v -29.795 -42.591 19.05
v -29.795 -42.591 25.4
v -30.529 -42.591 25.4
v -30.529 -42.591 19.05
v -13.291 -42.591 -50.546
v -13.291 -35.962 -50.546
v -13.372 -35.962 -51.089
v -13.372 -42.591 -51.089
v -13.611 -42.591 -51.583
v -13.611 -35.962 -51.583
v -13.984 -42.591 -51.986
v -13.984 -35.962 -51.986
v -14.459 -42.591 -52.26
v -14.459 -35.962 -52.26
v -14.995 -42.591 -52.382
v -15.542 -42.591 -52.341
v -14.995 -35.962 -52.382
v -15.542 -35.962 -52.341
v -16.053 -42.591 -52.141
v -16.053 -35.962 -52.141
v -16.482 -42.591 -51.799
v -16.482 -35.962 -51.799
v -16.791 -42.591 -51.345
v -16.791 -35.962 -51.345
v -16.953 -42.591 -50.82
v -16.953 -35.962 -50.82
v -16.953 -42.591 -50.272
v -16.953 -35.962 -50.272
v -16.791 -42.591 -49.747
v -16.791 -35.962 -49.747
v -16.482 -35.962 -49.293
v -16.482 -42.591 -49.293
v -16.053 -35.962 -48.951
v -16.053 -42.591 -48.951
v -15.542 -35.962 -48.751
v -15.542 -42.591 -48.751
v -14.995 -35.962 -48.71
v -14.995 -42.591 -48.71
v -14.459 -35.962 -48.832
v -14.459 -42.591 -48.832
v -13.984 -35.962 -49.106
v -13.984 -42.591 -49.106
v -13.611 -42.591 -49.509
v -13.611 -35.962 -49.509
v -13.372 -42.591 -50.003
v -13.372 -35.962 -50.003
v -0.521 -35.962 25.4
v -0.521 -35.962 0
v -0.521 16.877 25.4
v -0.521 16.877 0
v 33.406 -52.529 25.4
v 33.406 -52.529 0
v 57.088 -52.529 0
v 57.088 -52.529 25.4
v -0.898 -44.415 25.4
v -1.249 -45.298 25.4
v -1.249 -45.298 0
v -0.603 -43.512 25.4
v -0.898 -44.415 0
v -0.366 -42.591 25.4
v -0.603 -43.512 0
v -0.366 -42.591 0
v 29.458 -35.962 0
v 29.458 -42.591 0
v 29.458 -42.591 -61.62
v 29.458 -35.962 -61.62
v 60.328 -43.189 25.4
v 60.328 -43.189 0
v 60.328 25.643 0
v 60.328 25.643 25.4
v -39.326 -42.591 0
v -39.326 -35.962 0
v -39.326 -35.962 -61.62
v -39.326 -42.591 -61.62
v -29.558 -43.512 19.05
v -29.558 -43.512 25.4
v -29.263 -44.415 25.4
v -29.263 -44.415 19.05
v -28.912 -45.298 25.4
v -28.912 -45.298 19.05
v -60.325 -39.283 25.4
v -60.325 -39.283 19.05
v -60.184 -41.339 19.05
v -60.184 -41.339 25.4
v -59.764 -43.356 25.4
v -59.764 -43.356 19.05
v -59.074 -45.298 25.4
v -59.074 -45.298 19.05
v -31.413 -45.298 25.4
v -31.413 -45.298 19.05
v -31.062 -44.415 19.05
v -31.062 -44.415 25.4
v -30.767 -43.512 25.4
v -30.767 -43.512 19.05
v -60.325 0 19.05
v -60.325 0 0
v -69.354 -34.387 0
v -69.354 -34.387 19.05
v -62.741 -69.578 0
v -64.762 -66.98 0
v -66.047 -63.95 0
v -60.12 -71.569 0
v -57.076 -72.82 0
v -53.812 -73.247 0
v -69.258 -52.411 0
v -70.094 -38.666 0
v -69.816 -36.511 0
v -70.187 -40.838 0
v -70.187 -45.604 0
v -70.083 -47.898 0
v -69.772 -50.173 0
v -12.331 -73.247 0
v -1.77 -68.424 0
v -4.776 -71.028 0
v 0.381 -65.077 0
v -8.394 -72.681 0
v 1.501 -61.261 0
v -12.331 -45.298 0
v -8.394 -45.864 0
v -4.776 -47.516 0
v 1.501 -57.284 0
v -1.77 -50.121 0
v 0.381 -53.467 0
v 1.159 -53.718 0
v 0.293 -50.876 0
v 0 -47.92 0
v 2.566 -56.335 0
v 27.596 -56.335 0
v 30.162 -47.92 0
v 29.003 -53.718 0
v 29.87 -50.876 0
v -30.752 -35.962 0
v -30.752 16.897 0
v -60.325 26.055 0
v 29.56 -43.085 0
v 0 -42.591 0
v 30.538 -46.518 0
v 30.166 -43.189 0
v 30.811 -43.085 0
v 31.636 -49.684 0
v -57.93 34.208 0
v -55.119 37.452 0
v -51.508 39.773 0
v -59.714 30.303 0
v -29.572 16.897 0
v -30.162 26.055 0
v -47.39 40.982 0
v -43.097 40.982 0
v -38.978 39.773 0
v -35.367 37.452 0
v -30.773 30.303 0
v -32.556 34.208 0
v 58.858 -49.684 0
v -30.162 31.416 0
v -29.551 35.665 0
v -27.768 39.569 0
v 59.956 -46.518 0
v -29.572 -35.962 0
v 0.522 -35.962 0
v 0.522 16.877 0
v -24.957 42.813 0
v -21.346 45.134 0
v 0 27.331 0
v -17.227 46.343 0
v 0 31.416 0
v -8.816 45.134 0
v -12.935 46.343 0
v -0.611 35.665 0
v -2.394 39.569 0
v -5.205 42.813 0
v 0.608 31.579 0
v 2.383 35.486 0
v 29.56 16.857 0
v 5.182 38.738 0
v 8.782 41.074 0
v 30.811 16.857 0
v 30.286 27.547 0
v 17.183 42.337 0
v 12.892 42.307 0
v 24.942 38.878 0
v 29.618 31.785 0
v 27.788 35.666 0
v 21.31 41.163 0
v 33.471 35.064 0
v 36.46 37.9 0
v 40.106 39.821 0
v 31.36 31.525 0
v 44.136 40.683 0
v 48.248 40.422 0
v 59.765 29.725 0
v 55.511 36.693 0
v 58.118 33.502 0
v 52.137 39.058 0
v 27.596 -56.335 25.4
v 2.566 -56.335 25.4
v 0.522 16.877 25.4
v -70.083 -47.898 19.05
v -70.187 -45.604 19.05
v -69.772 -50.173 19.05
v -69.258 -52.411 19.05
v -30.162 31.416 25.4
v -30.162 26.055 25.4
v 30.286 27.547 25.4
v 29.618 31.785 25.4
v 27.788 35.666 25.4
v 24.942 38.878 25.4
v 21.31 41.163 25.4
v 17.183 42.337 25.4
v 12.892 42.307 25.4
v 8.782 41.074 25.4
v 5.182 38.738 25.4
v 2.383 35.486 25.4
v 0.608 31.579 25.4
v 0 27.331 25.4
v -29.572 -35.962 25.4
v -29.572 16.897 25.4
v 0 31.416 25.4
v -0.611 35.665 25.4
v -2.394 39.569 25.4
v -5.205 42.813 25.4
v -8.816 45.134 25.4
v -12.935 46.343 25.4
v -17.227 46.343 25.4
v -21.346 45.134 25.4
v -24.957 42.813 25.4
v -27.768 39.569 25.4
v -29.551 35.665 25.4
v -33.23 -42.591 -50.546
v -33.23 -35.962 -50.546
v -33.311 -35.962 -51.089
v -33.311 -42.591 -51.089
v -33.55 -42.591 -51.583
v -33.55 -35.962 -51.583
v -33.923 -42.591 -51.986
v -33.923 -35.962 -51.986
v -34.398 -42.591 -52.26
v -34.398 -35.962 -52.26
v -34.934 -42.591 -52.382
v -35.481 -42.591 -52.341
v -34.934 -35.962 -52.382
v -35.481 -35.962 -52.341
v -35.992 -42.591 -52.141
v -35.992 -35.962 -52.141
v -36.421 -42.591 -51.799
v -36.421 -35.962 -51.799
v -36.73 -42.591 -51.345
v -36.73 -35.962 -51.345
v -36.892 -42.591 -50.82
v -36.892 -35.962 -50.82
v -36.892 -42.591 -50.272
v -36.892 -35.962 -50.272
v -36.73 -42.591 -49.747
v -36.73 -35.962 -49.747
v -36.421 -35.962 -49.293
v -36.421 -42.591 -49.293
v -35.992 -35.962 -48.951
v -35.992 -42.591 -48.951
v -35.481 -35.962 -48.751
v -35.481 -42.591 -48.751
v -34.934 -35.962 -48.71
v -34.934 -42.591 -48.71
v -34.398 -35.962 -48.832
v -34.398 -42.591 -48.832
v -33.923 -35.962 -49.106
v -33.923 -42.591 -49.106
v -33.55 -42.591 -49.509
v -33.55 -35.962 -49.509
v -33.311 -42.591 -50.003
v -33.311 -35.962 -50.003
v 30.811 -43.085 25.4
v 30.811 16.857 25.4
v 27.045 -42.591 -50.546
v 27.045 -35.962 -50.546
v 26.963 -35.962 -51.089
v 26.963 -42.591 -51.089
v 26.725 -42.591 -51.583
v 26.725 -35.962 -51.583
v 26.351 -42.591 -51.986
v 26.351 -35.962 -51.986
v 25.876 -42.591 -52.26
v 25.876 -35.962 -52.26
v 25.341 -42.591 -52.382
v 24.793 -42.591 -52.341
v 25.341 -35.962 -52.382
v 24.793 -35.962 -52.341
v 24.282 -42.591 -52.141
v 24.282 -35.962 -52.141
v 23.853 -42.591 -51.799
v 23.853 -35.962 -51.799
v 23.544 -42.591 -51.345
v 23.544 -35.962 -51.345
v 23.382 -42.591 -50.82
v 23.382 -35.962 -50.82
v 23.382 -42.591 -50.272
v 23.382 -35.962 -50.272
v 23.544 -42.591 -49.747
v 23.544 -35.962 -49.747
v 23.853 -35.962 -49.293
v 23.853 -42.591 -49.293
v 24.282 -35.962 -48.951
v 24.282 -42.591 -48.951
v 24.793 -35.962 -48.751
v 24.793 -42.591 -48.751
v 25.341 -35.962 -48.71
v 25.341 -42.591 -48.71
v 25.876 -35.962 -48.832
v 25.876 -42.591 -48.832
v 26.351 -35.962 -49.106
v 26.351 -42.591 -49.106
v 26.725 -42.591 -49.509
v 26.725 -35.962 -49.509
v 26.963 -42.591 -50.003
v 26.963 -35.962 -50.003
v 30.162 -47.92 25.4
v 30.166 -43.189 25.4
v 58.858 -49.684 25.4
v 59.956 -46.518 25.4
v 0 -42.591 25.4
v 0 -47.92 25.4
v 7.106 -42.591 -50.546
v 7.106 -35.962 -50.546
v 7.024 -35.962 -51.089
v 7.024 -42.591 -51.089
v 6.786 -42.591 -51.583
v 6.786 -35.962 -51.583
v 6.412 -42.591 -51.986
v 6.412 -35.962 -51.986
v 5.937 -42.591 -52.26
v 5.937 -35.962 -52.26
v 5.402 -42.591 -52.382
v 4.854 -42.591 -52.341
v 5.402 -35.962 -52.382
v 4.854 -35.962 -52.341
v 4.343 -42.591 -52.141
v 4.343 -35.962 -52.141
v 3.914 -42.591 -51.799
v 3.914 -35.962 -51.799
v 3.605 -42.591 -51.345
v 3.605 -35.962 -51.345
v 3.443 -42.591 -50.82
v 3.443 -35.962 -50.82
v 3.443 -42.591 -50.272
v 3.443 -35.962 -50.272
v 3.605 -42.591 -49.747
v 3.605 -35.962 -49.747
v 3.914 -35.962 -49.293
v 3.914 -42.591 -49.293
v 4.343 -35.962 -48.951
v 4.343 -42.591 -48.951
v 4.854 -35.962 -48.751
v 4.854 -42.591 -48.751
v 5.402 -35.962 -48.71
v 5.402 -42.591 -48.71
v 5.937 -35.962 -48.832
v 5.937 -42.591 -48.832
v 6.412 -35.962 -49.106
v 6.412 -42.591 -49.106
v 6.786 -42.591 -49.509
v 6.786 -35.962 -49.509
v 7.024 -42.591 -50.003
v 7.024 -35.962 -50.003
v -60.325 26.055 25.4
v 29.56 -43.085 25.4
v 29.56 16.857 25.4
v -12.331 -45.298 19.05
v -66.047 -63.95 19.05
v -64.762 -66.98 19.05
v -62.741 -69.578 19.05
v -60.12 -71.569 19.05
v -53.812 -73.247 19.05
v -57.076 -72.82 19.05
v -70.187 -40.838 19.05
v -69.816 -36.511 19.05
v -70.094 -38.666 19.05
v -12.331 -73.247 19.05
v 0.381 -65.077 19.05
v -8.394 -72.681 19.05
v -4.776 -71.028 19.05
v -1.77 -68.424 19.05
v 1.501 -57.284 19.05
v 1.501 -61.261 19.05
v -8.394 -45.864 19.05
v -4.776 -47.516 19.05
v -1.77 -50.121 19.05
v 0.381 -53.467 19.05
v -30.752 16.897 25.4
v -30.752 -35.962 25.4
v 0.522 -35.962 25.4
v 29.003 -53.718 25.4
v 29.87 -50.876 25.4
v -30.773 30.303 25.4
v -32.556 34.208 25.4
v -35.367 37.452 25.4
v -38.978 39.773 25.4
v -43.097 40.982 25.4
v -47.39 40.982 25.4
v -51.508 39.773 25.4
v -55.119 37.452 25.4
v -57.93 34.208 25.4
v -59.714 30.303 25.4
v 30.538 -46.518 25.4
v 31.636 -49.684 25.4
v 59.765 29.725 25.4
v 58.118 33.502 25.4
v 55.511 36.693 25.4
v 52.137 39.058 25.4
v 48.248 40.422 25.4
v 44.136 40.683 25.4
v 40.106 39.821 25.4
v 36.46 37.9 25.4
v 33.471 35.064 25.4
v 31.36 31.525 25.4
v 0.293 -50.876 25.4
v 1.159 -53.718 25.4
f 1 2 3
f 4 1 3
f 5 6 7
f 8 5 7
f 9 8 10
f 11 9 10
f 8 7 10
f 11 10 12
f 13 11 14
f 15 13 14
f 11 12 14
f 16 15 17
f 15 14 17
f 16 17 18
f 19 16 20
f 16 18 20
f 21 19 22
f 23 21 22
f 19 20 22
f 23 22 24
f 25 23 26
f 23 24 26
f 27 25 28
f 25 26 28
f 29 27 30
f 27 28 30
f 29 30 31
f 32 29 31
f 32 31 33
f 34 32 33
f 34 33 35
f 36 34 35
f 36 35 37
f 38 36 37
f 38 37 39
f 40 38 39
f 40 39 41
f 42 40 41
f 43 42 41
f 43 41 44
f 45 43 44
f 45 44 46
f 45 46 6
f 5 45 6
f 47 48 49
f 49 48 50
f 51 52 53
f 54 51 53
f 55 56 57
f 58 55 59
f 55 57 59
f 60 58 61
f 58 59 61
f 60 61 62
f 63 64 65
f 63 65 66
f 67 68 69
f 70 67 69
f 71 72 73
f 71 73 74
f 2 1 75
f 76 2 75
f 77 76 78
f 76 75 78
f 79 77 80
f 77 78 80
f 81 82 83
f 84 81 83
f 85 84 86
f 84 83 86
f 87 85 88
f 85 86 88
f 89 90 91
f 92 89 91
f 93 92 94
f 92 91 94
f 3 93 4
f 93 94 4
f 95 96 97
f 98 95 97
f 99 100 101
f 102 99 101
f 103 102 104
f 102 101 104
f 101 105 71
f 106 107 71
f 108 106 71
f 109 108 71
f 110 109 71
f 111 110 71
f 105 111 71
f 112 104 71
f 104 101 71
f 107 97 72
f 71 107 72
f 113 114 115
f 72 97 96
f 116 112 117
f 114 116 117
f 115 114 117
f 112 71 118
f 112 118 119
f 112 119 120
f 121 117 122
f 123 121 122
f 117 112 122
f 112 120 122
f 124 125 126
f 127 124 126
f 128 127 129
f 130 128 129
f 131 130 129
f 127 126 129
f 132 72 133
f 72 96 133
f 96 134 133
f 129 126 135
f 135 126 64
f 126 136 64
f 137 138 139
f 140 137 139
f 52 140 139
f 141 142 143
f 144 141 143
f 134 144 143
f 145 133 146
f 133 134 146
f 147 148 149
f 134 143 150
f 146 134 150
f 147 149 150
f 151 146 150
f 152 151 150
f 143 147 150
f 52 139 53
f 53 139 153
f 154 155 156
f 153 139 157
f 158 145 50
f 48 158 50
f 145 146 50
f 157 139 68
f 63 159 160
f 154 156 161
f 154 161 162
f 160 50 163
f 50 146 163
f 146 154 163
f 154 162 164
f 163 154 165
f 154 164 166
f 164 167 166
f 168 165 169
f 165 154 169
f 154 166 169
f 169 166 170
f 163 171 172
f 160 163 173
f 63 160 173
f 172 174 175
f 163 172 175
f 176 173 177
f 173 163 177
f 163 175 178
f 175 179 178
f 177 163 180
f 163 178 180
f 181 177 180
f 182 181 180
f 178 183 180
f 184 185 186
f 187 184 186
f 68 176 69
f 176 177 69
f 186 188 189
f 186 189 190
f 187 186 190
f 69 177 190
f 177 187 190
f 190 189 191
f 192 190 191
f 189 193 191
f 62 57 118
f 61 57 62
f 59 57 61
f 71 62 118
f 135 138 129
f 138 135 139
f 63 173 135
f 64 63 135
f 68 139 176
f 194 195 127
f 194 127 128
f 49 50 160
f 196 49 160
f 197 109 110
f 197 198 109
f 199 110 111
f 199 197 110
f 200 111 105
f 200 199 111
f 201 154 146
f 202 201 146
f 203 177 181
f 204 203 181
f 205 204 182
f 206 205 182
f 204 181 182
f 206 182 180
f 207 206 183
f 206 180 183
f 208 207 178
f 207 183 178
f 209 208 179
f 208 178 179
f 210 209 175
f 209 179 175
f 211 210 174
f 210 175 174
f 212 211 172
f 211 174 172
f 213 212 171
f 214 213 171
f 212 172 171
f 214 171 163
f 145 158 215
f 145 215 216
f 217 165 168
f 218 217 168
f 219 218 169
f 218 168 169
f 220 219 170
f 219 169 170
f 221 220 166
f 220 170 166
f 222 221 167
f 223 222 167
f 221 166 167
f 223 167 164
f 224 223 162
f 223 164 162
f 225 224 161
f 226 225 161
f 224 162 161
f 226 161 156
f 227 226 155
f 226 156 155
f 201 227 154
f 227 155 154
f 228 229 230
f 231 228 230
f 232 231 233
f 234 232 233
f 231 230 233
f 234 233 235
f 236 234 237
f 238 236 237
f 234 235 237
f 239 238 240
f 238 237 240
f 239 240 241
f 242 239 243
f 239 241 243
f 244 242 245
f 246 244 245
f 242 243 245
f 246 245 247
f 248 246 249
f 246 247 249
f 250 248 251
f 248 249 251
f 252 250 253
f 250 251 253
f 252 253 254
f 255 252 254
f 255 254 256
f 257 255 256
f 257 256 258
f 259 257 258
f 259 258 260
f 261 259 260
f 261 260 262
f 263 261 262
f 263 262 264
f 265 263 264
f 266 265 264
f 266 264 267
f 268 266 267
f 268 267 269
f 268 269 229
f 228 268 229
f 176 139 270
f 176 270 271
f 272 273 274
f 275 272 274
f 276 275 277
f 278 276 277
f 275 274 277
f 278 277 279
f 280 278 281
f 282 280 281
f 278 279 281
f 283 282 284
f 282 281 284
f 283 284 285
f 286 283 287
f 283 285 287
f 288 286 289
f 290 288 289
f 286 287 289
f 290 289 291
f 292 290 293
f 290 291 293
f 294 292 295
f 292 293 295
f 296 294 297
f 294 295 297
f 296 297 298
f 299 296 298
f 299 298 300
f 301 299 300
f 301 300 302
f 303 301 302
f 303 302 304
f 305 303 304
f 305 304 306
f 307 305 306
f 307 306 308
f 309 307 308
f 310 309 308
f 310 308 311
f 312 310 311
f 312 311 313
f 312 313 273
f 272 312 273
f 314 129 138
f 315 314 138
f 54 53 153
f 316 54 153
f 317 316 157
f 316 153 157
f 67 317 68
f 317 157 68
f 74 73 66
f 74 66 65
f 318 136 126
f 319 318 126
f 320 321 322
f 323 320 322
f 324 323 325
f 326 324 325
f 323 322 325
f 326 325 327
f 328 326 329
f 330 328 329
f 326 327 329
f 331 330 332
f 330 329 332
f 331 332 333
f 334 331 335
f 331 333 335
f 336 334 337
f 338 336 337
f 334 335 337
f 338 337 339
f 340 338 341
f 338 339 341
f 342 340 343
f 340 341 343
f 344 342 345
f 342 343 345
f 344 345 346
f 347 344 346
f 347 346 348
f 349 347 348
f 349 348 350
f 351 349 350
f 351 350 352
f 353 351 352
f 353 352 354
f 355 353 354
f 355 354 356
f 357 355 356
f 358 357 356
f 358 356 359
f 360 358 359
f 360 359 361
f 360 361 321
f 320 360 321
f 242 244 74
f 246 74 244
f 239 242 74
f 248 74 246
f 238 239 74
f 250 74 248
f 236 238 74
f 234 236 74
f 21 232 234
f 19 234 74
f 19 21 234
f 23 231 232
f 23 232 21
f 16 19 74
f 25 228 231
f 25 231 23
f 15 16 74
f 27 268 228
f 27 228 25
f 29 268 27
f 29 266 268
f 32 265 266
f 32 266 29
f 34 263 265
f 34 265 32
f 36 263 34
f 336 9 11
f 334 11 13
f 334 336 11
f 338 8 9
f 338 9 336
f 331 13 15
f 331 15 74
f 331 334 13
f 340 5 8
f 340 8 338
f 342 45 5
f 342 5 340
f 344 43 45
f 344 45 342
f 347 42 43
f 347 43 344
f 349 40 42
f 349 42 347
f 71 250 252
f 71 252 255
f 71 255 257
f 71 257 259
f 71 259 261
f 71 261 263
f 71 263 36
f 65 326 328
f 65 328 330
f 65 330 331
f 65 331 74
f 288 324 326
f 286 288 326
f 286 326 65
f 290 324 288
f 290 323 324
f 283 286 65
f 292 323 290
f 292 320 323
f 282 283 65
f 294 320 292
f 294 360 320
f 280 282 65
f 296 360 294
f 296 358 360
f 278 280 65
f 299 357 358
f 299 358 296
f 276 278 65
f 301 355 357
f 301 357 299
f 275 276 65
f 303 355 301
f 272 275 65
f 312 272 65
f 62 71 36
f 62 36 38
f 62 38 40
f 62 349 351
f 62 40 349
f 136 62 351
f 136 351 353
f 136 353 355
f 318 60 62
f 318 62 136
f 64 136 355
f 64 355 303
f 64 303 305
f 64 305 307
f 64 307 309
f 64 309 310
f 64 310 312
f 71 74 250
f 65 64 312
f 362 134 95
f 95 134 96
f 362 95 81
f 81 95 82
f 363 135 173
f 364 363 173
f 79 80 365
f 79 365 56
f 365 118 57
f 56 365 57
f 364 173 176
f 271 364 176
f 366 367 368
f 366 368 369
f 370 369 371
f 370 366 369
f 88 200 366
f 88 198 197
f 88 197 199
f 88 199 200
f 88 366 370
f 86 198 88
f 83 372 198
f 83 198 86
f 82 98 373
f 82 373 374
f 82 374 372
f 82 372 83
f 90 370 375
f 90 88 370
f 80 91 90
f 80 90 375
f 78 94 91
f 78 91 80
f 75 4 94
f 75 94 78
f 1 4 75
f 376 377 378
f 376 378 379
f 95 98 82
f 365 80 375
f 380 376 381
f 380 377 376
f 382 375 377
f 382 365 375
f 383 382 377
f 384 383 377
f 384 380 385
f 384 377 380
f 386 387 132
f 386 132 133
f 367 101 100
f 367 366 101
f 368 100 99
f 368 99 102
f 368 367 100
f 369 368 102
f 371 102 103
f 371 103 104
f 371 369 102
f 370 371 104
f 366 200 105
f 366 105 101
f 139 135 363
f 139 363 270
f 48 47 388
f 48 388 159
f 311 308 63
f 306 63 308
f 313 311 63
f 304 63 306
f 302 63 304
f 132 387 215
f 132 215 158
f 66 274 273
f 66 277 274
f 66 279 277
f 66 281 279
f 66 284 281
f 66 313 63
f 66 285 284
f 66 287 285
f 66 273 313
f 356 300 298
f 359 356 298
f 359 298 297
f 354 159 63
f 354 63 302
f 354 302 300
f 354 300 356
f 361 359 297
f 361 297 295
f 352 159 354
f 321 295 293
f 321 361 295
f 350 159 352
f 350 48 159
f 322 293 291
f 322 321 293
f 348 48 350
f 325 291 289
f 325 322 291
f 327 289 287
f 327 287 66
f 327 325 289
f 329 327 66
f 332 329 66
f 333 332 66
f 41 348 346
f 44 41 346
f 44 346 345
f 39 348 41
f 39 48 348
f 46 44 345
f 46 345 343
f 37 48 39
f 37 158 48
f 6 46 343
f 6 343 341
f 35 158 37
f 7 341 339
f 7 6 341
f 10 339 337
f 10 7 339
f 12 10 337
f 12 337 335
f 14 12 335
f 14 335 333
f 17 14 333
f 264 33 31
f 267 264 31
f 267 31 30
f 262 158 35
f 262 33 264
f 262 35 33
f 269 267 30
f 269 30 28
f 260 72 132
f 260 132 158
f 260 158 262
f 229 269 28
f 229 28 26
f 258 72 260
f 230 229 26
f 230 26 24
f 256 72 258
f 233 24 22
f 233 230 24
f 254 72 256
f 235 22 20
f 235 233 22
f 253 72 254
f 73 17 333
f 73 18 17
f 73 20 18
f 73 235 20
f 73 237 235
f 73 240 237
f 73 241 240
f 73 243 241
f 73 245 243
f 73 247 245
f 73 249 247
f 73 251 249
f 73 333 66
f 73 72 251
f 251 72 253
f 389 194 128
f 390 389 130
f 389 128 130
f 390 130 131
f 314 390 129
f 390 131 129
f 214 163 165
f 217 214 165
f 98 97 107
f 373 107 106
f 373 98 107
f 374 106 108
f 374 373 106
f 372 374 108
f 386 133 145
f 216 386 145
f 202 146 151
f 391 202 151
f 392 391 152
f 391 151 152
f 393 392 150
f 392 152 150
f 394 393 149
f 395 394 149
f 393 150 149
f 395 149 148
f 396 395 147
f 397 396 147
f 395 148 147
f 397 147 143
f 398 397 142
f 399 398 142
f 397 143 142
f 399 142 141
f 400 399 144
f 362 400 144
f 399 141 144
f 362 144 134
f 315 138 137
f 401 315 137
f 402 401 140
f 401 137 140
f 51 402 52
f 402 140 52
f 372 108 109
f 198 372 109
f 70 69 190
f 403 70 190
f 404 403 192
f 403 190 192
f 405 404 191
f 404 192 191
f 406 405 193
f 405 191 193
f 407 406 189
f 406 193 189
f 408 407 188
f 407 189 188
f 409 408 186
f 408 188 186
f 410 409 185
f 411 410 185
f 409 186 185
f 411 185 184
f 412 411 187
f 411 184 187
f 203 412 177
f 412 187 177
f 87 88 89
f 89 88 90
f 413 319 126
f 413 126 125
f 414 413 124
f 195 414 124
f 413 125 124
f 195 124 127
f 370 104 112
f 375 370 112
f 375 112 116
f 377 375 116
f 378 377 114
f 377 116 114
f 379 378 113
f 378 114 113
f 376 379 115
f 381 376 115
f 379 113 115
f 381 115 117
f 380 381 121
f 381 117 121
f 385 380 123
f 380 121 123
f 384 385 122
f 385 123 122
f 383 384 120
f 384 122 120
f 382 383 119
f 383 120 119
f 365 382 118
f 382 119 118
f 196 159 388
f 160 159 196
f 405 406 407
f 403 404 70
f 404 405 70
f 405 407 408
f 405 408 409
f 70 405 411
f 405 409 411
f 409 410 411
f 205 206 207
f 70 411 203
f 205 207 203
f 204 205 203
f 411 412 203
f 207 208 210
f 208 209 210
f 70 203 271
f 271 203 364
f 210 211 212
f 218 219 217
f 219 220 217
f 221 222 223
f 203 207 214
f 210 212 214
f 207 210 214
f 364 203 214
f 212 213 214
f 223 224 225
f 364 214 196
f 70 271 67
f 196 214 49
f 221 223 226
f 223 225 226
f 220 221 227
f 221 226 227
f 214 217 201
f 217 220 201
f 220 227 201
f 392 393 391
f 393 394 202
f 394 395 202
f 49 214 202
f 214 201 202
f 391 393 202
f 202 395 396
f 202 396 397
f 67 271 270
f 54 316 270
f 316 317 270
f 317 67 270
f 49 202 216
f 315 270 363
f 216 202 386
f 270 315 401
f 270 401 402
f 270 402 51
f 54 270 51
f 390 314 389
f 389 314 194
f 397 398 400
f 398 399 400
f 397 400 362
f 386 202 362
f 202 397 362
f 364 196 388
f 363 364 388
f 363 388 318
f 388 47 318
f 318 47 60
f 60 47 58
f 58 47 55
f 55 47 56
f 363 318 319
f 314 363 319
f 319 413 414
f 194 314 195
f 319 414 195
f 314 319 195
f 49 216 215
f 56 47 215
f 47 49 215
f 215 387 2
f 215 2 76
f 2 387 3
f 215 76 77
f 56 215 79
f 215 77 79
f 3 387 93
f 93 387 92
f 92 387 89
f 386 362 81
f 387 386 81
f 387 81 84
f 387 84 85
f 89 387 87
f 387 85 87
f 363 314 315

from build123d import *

# Parameters (mm, degrees)
F0_W      = 1.1809540468
F0_H      = 55.4866959378
F0_W_2    = 1.0430663562
F0_H_2    = 55.8827305807
F0_W_3    = 1.2505598919
F0_H_3    = 59.9420672474
F1_DEPTH  = 25.4
F2_DEPTH  = 19.05
F4_R      = 25.4
F5_R      = 12.7
F6_DEPTH  = 61.6204
F7_DEPTH  = 45.466
F8_DEPTH  = 87.0204
F10_DEPTH = 37.285599403


with BuildPart() as f1:
    # F0 (on Top) → F1 (new body)
    with BuildSketch(Plane.XY):
        with BuildLine():
            ThreePointArc((-31.4129105711, -45.2980363816), (-30.4781671858, -42.3561098061), (-30.1620009138, -39.2854883608))
            ThreePointArc((-30.1620009138, -39.2854883608), (-29.8463674498, -42.3560514479), (-28.912179671, -45.2980363816))
            Line((-28.912179671, -45.2980363816), (-12.330923231, -45.2980363816))
            Line((-12.330923231, -45.2980363816), (-1.2493222605, -45.2980363816))
            ThreePointArc((-1.2493222605, -45.2980363816), (-0.3153893091, -42.3572770972), (0.0004989823, -39.2879920805))
            Line((0.0004989823, -39.2879920805), (0, -47.9196608067))
            ThreePointArc((0, -47.9196608067), (0.6558623791, -52.3187849866), (2.5664044493, -56.3352857035))
            Line((2.5664044493, -56.3352857035), (27.5960955507, -56.3352857035))
            ThreePointArc((27.5960955507, -56.3352857035), (29.5066376209, -52.3187849866), (30.1625, -47.9196608067))
            Line((30.1625, -47.9196608067), (30.1656608492, -43.188519241))
            ThreePointArc((30.1656608492, -43.188519241), (30.9988064443, -48.131759315), (33.4061909682, -52.5288326332))
            Line((33.4061909682, -52.5288326332), (57.0876307301, -52.5288326332))
            ThreePointArc((57.0876307301, -52.5288326332), (59.4950152541, -48.131759315), (60.3281608492, -43.188519241))
            Line((60.3281608492, -43.188519241), (60.3281608492, 25.6428197026))
            ThreePointArc((60.3281608492, 25.6428197026), (46.2008131527, 40.6938718904), (30.2863311656, 27.5468042333))
            ThreePointArc((30.2863311656, 27.5468042333), (15.0360783361, 42.4746485662), (0, 27.3310989141))
            Line((0, 27.3310989141), (0, 31.4158573747))
            ThreePointArc((0, 31.4158573747), (-15.0810004563, 46.496857831), (-30.1620009126, 31.4158573747))
            Line((-30.1620009126, 31.4158573747), (-30.1620009127, 26.0546095664))
            ThreePointArc((-30.1620009127, 26.0546095664), (-45.243250861, 41.1358595153), (-60.3245008099, 26.0546095669))
            Line((-60.3245008099, 26.0546095669), (-60.3245008099, 0))
            Line((-60.3245008099, 0), (-60.3245008099, -39.2829846411))
            ThreePointArc((-60.3245008099, -39.2829846411), (-60.0085894761, -42.3548841799), (-59.0735911526, -45.2980363816))
            Line((-59.0735911526, -45.2980363816), (-31.4129105711, -45.2980363816))
        make_face()
        with Locations((-30.1620009133, -10.8462562301)):
            Rectangle(F0_W, F0_H, mode=Mode.SUBTRACT)
        with Locations((0.0002494911, -11.0644246154)):
            Rectangle(F0_W_2, F0_H_2, mode=Mode.SUBTRACT)
        with Locations((30.1857188067, -13.1142732591)):
            Rectangle(F0_W_3, F0_H_3, mode=Mode.SUBTRACT)
    extrude(amount=F1_DEPTH)

    # F0 (on Top) → F2 (join)
    with BuildSketch(Plane.XY):
        with BuildLine():
            ThreePointArc((-28.912179671, -45.2980363816), (-29.8463674498, -42.3560514479), (-30.1620009138, -39.2854883608))
            ThreePointArc((-30.1620009138, -39.2854883608), (-30.4781671858, -42.3561098061), (-31.4129105711, -45.2980363816))
            Line((-31.4129105711, -45.2980363816), (-59.0735911526, -45.2980363816))
            ThreePointArc((-59.0735911526, -45.2980363816), (-60.0085894761, -42.3548841799), (-60.3245008099, -39.2829846411))
            Line((-60.3245008099, -39.2829846411), (-60.3245008099, 0))
            Line((-60.3245008099, 0), (-70.1869130135, -37.5586524606))
            Line((-70.1869130135, -37.5586524606), (-70.1869130135, -49.070879817))
            Line((-70.1869130135, -49.070879817), (-63.4611696021, -73.2465684414))
            Line((-63.4611696021, -73.2465684414), (-12.330923231, -73.2465684414))
            ThreePointArc((-12.330923231, -73.2465684414), (1.6433427989, -59.2723024115), (-12.330923231, -45.2980363816))
            Line((-12.330923231, -45.2980363816), (-28.912179671, -45.2980363816))
        make_face()
    extrude(amount=F2_DEPTH)

    # F4
    f4_edges = [f1.edges().sort_by_distance(p)[0] for p in [
        (-70.186913, -37.558652, 9.525),
        (-70.186913, -49.07088, 9.525),
    ]]
    fillet(f4_edges, radius=F4_R)

    # F5
    f5_edges = [f1.edges().sort_by_distance(p)[0] for p in [
        (-63.46117, -73.246568, 9.525),
    ]]
    fillet(f5_edges, radius=F5_R)

    # F3 (on face) → F6 (join)
    with BuildSketch(Plane.XY):
        with BuildLine():
            Line((-30.7524779367, -35.9619690384), (-39.3256613186, -35.9619690384))
            Line((-39.3256613186, -35.9619690384), (-39.3256613186, -42.5913690384))
            Line((-39.3256613186, -42.5913690384), (-30.529074842, -42.5913690384))
            ThreePointArc((-30.529074842, -42.5913690384), (-30.2541193355, -40.9485795087), (-30.1620009138, -39.2854883608))
            ThreePointArc((-30.1620009138, -39.2854883608), (-30.0701620308, -40.9485637633), (-29.7954894935, -42.5913690384))
            Line((-29.7954894935, -42.5913690384), (-0.366012438, -42.5913690384))
            ThreePointArc((-0.366012438, -42.5913690384), (-0.0914778965, -40.9498079941), (0.0004989823, -39.2879920805))
            Line((0.0004989823, -39.2879920805), (0.0003080196, -42.5913690384))
            Line((0.0003080196, -42.5913690384), (29.4575386814, -42.5913690384))
            Line((29.4575386814, -42.5913690384), (29.4575386814, -35.9619690384))
            Line((29.4575386814, -35.9619690384), (0.5217826692, -35.9619690384))
            Line((0.5217826692, -35.9619690384), (0.5217826692, -39.0057899058))
            Line((0.5217826692, -39.0057899058), (-0.5212836869, -39.0057899058))
            Line((-0.5212836869, -39.0057899058), (-0.5212836869, -35.9619690384))
            Line((-0.5212836869, -35.9619690384), (-29.5715238899, -35.9619690384))
            Line((-29.5715238899, -35.9619690384), (-29.5715238899, -38.5896041989))
            Line((-29.5715238899, -38.5896041989), (-30.7524779367, -38.5896041989))
            Line((-30.7524779367, -38.5896041989), (-30.7524779367, -35.9619690384))
        make_face()
    extrude(amount=-F6_DEPTH)

    # F7 (add): a face of the model
    f7_faces = [f1.faces().sort_by_distance(p)[0] for p in [
        (-39.3256613186, -39.2766690384, -30.8102),
    ]]
    extrude(f7_faces, amount=-F7_DEPTH)

    # F8 (add, through all): a face of the model
    f8_faces = [f1.faces().sort_by_distance(p)[0] for p in [
        (-4.9340613186, -39.2766690384, -61.6204),
    ]]
    extrude(f8_faces, amount=-F8_DEPTH)

    # F9 (on face) → F10 (cut, through all)
    with BuildSketch(Plane(origin=(0, -35.9619690384, 0), x_dir=(-1, 0, 0), z_dir=(0, 1, 0))):
        with BuildLine():
            ThreePointArc((-23.3615386814, -50.546), (-25.2030386814, -48.7045), (-27.0445386814, -50.546))
            Line((-27.0445386814, -50.546), (-23.3615386814, -50.546))
        make_face()
        with BuildLine():
            Line((-23.3615386814, -50.546), (-27.0445386814, -50.546))
            ThreePointArc((-27.0445386814, -50.546), (-25.2030386814, -52.3875), (-23.3615386814, -50.546))
        make_face()
        with BuildLine():
            Line((-7.1055386814, -50.546), (-3.4225386814, -50.546))
            ThreePointArc((-3.4225386814, -50.546), (-5.2640386814, -48.7045), (-7.1055386814, -50.546))
        make_face()
        with BuildLine():
            ThreePointArc((-7.1055386814, -50.546), (-5.2640386814, -52.3875), (-3.4225386814, -50.546))
            Line((-3.4225386814, -50.546), (-7.1055386814, -50.546))
        make_face()
        with BuildLine():
            Line((13.2906613186, -50.546), (16.9736613186, -50.546))
            ThreePointArc((16.9736613186, -50.546), (15.1321613186, -48.7045), (13.2906613186, -50.546))
        make_face()
        with BuildLine():
            ThreePointArc((13.2906613186, -50.546), (15.1321613186, -52.3875), (16.9736613186, -50.546))
            Line((16.9736613186, -50.546), (13.2906613186, -50.546))
        make_face()
        with BuildLine():
            Line((33.2296613186, -50.546), (36.9126613186, -50.546))
            ThreePointArc((36.9126613186, -50.546), (35.0711613186, -48.7045), (33.2296613186, -50.546))
        make_face()
        with BuildLine():
            ThreePointArc((33.2296613186, -50.546), (35.0711613186, -52.3875), (36.9126613186, -50.546))
            Line((36.9126613186, -50.546), (33.2296613186, -50.546))
        make_face()
    extrude(amount=-F10_DEPTH, mode=Mode.SUBTRACT)


solid = f1.part
